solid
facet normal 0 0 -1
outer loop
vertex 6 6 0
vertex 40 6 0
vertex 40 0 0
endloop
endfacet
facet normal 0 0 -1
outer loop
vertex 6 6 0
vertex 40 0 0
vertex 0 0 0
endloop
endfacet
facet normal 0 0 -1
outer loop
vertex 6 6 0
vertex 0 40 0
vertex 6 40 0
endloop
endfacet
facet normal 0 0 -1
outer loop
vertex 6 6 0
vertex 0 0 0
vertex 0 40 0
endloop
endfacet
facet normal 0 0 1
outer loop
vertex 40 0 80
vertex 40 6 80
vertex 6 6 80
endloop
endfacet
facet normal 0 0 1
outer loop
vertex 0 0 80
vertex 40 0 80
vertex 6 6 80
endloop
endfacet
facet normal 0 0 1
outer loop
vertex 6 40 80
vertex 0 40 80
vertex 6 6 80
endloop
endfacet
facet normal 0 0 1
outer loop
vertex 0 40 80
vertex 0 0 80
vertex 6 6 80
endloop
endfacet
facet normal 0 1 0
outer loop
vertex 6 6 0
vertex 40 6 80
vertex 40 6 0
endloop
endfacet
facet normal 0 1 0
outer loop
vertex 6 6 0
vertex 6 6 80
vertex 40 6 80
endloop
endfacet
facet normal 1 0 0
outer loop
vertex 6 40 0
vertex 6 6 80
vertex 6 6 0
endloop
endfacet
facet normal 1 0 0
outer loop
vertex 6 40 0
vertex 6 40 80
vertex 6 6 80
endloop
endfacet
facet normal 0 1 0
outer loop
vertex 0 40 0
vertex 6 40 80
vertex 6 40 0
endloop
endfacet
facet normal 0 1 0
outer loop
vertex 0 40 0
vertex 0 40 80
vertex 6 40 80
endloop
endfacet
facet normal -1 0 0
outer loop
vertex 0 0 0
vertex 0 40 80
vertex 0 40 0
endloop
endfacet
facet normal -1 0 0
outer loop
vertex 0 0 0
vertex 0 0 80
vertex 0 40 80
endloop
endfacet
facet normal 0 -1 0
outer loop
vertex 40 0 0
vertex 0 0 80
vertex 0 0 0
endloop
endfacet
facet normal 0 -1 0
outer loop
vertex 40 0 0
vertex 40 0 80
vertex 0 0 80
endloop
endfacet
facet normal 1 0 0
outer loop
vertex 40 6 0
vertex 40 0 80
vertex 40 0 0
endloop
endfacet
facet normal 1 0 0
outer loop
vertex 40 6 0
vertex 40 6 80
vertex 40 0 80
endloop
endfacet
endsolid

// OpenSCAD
$fn = 32;

// ----------------------------------------------------------------------
// Structural section: angle 40 x 40 mm
// ----------------------------------------------------------------------

// --- parameters (mm) ---
sec_w = 40;               // leg width, X
sec_h = 40;               // leg height, Y
flange_t = 6;             // leg thickness
plate_t = 80;             // cut length, Z (extrusion height)

profile = [[0, 0], [40, 0], [40, 6], [6, 6], [6, 40], [0, 40]];  // primary outline, 6 points, counter clockwise

// --- the one profile operation ---
linear_extrude(height = plate_t) polygon(points = profile);
